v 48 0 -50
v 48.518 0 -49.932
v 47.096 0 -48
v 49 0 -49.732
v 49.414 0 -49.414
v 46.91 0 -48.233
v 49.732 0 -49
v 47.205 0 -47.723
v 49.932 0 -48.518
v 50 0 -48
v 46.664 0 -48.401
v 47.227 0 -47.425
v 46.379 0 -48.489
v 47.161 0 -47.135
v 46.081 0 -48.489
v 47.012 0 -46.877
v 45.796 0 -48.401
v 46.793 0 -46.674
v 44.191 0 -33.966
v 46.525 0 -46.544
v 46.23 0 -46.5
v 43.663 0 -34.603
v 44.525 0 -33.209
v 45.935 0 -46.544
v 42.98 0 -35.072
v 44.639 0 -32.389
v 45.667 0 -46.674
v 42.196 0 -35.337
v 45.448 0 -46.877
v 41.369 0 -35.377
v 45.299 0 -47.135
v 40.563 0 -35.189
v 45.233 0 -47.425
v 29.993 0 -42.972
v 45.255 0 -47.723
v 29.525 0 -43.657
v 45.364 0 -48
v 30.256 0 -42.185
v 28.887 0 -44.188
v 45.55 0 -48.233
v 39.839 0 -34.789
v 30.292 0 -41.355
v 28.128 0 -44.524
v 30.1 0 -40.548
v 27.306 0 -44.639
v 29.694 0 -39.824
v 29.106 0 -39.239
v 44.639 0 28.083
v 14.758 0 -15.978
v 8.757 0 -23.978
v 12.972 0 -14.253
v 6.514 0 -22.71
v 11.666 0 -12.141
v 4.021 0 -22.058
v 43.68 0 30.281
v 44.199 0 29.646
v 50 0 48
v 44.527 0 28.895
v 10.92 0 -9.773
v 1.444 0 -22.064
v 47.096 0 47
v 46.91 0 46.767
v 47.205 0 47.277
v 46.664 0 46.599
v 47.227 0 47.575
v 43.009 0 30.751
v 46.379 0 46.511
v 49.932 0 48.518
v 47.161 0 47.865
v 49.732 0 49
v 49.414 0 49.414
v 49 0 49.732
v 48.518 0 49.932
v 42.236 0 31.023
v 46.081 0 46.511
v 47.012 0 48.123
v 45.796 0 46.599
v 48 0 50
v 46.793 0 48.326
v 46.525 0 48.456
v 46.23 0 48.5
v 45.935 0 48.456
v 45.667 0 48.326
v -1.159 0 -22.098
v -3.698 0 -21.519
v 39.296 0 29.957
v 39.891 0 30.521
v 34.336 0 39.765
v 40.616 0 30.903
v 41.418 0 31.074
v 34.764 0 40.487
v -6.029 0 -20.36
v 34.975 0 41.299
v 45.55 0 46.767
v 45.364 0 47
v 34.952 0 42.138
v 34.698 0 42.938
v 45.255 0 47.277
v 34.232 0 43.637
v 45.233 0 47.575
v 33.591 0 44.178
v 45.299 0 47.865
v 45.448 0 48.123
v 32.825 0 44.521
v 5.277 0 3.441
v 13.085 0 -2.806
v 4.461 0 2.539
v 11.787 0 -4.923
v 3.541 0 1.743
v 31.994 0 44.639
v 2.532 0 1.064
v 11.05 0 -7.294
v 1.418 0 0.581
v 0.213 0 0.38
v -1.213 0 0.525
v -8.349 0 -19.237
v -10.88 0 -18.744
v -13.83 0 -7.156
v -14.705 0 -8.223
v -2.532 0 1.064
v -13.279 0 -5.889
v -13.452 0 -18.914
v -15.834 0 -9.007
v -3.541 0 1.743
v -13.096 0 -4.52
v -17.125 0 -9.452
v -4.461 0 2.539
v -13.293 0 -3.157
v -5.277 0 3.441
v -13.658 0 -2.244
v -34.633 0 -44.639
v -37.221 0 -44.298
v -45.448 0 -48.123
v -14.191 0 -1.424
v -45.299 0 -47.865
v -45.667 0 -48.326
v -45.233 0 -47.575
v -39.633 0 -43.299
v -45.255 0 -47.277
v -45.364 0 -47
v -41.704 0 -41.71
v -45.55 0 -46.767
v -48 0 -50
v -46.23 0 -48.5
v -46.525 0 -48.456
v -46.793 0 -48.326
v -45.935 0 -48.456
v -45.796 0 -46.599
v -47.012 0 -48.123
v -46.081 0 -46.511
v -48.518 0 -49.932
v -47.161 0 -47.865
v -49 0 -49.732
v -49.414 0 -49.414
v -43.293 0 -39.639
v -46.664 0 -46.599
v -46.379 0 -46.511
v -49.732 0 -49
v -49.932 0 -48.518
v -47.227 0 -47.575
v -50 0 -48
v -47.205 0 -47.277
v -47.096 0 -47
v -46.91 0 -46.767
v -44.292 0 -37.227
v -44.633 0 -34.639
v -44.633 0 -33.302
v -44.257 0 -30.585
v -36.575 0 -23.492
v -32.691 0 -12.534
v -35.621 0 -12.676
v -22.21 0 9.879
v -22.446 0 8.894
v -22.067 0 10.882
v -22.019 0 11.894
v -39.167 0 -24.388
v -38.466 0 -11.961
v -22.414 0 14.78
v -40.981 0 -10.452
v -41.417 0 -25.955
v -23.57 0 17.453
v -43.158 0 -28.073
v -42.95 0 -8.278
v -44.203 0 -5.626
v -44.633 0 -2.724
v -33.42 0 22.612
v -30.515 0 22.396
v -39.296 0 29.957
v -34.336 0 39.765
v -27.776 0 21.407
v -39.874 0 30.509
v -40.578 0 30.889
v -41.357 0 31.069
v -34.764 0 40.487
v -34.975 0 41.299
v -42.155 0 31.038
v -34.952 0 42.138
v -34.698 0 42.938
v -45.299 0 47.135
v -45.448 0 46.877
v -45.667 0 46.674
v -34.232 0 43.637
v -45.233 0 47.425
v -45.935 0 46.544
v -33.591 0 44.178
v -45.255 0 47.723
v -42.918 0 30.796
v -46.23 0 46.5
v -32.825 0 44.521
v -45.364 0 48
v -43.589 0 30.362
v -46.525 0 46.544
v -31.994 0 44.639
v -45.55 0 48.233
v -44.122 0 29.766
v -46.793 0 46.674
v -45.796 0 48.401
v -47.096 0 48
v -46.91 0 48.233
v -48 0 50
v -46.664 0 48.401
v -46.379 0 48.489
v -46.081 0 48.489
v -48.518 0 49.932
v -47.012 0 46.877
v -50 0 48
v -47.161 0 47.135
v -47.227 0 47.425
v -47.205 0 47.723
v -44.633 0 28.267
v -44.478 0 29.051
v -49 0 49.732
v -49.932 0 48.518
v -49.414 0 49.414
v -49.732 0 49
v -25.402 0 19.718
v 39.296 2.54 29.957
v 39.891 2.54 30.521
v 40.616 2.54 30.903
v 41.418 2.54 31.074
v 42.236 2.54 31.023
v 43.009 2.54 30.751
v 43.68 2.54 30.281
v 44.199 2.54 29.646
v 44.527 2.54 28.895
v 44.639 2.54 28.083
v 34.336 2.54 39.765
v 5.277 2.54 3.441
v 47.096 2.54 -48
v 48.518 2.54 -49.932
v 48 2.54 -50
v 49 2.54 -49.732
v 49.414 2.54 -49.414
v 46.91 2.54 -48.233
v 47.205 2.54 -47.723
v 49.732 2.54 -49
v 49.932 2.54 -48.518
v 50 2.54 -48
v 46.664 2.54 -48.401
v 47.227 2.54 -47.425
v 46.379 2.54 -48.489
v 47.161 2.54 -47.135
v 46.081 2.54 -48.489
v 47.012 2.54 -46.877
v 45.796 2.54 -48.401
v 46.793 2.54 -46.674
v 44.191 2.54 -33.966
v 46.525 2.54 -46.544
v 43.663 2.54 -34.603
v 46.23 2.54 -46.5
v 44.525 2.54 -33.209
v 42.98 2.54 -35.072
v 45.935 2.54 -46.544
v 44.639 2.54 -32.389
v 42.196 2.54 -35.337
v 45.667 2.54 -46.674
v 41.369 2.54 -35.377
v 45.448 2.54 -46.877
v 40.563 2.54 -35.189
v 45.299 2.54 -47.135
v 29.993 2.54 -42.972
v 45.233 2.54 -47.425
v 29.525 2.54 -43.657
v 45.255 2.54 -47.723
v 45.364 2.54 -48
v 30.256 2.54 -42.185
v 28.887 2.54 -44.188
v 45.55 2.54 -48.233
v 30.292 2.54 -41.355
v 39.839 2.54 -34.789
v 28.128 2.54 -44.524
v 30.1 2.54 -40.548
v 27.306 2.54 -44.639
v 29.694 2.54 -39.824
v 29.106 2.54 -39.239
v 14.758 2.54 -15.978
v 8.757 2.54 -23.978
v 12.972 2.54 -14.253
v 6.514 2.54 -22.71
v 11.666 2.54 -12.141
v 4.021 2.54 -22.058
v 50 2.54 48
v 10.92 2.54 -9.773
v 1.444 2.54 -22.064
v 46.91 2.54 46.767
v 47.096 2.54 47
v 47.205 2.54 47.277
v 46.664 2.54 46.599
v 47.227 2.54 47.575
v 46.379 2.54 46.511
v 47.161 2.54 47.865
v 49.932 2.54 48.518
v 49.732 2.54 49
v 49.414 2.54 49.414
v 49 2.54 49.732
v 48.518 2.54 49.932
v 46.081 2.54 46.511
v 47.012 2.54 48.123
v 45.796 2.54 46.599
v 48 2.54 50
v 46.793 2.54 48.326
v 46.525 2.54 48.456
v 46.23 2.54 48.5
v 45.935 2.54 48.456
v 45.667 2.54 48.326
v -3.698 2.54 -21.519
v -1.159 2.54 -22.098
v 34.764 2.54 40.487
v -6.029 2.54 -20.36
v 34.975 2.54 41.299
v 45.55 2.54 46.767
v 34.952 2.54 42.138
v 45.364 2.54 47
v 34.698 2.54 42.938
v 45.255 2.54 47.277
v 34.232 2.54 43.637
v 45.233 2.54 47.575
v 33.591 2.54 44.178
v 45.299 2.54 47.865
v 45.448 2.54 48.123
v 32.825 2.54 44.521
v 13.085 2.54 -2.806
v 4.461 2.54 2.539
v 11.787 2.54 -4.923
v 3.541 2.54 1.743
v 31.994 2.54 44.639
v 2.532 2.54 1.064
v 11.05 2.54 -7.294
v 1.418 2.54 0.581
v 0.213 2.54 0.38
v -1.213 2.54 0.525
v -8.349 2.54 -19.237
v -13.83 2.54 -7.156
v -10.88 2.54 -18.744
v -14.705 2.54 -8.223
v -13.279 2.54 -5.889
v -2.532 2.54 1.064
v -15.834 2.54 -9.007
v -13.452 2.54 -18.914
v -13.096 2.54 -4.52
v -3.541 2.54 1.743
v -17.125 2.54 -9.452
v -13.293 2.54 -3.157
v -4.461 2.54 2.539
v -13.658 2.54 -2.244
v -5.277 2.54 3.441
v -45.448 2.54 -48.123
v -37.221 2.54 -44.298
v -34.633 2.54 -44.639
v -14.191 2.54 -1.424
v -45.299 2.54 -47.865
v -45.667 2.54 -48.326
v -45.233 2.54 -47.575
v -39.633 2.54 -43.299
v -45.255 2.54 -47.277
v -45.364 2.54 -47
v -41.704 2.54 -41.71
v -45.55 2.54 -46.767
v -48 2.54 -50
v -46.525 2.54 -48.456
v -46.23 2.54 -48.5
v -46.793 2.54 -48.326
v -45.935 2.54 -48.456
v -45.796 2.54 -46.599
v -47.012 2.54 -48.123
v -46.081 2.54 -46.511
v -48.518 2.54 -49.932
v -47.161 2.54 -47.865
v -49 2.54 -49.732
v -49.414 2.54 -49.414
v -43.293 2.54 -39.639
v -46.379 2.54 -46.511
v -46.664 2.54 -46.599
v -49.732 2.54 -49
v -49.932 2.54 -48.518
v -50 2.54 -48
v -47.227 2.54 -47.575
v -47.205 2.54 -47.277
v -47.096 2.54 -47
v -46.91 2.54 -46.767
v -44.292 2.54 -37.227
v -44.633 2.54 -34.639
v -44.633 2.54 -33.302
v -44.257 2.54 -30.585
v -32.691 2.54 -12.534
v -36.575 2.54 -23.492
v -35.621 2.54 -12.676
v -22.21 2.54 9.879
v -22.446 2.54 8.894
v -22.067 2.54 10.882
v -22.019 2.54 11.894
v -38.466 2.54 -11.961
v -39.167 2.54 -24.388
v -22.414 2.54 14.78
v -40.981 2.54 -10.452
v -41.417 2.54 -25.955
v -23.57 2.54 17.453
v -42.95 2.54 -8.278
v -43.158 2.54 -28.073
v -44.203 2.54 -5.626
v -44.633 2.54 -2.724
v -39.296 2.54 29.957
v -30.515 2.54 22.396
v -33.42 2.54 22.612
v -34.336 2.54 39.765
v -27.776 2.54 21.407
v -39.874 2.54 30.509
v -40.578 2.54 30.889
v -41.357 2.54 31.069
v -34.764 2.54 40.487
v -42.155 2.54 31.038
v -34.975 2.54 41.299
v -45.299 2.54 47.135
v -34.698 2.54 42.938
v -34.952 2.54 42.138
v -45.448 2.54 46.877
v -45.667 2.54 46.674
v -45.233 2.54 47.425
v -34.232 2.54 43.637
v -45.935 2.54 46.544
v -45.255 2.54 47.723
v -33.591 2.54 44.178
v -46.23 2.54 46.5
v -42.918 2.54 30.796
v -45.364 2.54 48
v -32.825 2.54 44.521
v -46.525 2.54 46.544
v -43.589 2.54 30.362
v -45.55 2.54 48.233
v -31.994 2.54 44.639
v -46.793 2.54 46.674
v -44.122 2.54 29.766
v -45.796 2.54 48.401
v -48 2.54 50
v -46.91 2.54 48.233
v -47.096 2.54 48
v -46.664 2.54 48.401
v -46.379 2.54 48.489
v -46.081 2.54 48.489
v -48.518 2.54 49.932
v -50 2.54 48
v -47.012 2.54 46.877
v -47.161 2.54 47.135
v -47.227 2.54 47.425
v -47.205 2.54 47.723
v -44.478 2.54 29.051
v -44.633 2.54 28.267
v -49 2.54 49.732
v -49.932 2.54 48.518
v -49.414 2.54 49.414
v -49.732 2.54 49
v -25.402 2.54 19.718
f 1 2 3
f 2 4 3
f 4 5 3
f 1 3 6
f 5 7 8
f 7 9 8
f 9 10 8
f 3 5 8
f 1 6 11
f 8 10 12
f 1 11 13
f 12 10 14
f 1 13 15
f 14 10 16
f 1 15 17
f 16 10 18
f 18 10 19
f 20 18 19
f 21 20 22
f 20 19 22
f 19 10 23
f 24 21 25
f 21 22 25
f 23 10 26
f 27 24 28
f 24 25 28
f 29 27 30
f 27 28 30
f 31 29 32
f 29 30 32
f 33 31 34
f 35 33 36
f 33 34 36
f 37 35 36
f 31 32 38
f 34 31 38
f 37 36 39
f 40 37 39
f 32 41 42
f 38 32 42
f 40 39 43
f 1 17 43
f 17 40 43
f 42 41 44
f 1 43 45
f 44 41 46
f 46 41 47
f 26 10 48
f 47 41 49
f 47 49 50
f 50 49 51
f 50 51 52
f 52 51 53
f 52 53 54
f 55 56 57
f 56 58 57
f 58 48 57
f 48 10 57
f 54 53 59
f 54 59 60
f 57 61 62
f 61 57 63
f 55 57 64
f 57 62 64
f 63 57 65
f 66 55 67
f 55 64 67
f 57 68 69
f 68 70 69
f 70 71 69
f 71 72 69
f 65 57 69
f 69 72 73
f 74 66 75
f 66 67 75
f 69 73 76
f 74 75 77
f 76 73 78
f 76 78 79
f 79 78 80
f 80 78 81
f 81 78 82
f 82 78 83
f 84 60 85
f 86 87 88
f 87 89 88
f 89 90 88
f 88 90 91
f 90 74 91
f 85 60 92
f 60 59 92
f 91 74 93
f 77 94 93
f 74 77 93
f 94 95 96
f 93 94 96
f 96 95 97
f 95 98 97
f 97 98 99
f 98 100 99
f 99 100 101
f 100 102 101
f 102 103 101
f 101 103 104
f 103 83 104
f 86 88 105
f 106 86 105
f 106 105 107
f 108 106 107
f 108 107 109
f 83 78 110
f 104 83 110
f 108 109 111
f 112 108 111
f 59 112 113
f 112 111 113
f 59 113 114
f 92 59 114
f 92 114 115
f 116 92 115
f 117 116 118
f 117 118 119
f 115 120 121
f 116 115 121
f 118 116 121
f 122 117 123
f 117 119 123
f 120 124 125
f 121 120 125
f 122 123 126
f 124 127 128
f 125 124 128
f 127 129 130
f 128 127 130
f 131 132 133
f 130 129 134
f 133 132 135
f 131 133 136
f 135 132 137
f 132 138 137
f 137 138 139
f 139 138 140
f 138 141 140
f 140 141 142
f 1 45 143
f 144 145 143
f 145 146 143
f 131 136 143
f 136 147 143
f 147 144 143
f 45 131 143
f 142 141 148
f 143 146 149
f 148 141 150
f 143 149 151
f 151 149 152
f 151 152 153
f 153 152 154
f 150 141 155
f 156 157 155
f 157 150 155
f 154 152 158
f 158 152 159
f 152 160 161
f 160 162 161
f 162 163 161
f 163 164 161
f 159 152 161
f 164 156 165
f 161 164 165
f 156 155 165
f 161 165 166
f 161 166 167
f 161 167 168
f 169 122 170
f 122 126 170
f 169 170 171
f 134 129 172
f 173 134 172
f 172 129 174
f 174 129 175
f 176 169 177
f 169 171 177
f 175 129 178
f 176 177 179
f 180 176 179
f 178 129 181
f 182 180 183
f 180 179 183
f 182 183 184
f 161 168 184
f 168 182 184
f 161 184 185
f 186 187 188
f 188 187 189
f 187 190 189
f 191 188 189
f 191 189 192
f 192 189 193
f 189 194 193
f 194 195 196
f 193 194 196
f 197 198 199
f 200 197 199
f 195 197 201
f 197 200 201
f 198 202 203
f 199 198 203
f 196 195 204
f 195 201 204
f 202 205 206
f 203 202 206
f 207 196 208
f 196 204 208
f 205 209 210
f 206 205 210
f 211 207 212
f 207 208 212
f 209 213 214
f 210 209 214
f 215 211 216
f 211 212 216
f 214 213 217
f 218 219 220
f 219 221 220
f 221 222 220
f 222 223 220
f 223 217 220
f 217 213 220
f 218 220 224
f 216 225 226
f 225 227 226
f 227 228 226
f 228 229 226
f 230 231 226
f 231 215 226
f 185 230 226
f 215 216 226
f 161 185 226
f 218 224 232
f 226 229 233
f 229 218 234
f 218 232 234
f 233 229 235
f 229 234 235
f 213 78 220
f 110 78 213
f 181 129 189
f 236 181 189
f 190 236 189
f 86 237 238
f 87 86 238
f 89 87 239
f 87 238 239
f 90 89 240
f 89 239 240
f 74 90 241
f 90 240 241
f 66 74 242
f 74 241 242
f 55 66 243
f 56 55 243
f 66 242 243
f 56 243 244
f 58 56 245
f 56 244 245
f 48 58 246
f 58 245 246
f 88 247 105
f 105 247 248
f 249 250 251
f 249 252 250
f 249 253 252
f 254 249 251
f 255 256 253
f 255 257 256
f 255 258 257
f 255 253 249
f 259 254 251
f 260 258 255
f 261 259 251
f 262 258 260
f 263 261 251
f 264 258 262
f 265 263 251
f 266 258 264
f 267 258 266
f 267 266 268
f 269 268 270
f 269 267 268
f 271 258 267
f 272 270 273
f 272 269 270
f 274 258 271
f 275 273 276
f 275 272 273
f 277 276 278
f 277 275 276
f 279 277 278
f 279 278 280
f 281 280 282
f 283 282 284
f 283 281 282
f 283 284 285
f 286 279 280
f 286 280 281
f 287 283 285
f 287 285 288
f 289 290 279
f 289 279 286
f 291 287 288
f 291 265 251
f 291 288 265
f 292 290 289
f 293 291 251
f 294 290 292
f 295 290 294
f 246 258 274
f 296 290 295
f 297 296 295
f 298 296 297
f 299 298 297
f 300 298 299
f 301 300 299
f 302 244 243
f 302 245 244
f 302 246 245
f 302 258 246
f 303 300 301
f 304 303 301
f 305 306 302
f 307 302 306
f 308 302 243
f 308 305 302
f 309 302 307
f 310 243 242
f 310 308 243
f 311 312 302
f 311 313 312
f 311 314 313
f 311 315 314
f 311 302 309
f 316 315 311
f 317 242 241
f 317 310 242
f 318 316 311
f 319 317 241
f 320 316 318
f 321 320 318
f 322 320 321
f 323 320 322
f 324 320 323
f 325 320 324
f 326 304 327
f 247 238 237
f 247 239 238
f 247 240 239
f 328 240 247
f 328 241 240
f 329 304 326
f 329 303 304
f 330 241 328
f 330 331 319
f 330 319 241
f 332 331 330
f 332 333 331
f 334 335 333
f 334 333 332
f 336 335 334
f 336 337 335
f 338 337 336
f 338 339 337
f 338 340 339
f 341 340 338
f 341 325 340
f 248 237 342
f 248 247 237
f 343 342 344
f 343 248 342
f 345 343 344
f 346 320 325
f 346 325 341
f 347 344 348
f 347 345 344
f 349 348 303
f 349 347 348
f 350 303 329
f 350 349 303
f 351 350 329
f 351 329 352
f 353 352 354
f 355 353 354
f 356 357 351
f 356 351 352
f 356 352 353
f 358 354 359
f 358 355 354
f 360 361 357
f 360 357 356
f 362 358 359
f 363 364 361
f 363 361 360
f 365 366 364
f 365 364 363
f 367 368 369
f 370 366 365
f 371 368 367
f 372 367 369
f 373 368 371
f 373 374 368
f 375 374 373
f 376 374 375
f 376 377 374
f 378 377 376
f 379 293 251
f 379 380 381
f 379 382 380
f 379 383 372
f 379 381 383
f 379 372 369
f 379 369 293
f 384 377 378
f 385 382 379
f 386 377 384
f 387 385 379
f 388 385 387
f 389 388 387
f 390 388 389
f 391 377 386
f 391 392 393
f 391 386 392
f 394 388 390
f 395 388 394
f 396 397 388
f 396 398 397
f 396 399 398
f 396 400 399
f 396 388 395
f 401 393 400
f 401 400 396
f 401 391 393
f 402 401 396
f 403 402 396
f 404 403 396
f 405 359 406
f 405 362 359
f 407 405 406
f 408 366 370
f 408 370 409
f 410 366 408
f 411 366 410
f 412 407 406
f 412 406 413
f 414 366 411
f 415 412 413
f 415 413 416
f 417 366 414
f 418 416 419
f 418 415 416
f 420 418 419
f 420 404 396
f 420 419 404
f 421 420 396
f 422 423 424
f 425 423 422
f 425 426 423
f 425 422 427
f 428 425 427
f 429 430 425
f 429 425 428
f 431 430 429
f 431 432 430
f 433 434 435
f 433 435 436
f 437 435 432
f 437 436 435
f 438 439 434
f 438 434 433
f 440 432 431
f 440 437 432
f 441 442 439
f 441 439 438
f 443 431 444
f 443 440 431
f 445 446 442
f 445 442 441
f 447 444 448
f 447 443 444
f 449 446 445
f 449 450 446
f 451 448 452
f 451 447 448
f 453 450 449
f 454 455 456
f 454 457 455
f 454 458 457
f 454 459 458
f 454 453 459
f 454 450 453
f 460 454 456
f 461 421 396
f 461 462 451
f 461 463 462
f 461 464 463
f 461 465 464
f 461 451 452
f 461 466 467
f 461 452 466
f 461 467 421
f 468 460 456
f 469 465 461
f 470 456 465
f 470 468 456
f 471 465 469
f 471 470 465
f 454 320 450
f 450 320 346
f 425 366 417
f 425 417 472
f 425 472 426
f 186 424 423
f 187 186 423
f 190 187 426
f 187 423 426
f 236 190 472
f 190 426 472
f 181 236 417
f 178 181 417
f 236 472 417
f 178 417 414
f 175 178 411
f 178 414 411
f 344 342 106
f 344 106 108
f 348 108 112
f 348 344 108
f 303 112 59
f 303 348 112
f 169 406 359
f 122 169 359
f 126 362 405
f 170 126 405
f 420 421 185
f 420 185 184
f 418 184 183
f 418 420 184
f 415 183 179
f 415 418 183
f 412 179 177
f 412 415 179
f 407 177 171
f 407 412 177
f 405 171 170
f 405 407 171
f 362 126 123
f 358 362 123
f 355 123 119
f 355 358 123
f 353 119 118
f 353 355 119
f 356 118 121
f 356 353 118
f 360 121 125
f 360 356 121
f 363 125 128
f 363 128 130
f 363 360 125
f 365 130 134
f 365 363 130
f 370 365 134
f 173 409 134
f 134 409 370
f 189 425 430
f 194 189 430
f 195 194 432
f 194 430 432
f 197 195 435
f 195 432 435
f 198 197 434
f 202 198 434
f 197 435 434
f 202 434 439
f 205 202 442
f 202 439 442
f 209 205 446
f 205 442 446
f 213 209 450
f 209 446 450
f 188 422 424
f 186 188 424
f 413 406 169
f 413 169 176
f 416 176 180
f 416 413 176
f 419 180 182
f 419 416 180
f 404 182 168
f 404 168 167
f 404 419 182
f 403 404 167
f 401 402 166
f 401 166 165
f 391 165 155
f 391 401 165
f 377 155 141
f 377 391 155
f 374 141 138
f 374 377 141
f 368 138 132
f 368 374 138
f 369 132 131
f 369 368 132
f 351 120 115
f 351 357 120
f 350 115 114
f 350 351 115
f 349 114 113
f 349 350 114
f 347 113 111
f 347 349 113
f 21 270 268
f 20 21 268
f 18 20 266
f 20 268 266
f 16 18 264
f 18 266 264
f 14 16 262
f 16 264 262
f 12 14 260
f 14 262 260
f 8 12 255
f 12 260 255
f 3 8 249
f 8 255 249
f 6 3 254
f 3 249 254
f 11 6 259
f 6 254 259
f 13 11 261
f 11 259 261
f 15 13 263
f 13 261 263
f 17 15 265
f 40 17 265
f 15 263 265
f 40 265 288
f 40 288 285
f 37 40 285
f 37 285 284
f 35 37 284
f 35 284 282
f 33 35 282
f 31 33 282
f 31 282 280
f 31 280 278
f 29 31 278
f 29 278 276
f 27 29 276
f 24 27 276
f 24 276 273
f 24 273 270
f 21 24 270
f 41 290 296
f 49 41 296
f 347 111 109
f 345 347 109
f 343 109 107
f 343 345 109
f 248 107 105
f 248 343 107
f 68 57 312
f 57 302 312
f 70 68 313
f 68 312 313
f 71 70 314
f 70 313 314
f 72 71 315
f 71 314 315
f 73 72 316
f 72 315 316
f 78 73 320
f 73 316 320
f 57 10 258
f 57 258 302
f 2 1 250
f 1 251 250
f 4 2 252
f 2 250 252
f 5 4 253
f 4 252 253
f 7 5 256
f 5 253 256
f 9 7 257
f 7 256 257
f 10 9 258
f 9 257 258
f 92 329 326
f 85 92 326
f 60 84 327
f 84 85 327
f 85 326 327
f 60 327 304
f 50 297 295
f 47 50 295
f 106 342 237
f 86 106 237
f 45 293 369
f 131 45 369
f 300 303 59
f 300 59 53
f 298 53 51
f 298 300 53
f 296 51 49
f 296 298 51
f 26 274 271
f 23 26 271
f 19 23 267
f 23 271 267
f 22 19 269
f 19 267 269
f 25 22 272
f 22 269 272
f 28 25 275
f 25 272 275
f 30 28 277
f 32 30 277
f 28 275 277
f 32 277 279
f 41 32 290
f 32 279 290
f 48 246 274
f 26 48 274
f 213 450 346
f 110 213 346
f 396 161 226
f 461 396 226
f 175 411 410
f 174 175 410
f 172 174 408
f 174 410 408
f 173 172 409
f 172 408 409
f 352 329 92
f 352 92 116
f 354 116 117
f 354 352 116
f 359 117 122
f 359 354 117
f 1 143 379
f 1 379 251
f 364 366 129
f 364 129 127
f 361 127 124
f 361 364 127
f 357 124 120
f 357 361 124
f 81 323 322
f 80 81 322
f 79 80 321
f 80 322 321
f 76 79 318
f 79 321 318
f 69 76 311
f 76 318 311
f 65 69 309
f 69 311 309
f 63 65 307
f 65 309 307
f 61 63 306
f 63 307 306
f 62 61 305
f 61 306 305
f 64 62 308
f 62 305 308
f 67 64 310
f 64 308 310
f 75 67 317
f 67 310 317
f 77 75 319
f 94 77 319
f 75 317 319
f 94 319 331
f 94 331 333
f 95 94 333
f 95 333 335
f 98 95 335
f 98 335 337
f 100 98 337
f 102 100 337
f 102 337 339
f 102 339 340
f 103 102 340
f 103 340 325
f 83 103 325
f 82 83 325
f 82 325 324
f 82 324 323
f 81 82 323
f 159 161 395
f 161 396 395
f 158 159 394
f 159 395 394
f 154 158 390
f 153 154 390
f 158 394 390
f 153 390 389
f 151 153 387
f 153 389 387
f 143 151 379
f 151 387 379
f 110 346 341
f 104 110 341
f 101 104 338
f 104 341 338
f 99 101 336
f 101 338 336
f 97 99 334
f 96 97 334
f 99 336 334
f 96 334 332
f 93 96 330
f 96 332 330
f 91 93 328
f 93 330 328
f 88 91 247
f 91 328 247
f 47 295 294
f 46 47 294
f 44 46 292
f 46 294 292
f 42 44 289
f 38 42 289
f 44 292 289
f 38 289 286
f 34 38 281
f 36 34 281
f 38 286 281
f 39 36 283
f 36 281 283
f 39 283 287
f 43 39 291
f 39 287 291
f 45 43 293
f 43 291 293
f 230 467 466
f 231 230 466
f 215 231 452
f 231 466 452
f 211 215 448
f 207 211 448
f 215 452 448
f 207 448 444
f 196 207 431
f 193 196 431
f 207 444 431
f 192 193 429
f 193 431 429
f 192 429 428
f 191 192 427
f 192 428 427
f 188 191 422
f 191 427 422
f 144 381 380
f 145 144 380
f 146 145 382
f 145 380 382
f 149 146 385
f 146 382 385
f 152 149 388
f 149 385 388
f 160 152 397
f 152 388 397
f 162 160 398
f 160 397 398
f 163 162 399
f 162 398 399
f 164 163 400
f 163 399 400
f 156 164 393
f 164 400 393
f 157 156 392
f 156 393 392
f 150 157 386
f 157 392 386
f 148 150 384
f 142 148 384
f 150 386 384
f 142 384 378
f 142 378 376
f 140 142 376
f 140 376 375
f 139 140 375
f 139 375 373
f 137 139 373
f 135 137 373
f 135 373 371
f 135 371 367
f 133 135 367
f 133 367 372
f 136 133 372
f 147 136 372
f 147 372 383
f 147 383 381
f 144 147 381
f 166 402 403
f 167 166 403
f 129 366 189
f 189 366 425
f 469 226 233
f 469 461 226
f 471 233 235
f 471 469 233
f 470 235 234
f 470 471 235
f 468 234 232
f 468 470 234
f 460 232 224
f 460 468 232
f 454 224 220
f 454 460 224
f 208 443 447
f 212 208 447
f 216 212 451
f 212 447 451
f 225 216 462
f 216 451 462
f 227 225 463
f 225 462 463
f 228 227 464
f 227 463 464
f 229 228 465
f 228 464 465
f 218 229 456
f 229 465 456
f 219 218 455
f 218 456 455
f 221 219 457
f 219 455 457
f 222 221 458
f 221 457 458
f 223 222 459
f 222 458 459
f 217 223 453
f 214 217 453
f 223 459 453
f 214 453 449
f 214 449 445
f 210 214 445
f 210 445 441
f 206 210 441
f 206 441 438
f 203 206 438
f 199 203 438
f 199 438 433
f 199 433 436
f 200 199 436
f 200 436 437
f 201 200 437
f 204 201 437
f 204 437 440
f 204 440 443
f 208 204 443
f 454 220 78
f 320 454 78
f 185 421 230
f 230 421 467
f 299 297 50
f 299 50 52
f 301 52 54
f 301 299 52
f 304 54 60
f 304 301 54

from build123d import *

# Parameters (mm, degrees)
SKETCH1_W           = 100
SKETCH1_H           = 100
BOSS_EXTRUDE1_DEPTH = 2.54
FILLET1_R           = 2
CUT_EXTRUDE1_DEPTH  = 10
SKETCH2_R           = 1
CUT_EXTRUDE2_DEPTH  = 10
FILLET2_R           = 10
FILLET3_R           = 5


with BuildPart() as part:
    # Sketch1 → Boss-Extrude1 (new body)
    with BuildSketch(Plane.XZ):
        Rectangle(SKETCH1_W, SKETCH1_H)
    extrude(amount=-BOSS_EXTRUDE1_DEPTH)

    # Fillet1
    fillet1_edges = [part.edges().sort_by_distance(p)[0] for p in [
        (-50, 1.27, 50),
        (50, 1.27, 50),
        (50, 1.27, -50),
        (-50, 1.27, -50),
    ]]
    fillet(fillet1_edges, radius=FILLET1_R)

    # Sketch5 → Cut-Extrude1 (cut)
    with BuildSketch(Plane(origin=(0, 2.54, 0), x_dir=(1, 0, 0), z_dir=(0, 1, 0))):
        with BuildLine():
            Line((-10.582420377, 8.15726173), (-44.633181304, 14.898200311))
            Line((-44.633181304, 14.898200311), (-44.633181304, -28.266598236))
            ThreePointArc((-44.633181304, -28.266598236), (-42.544556917, -30.942665333), (-39.296225546, -29.95674939))
            Line((-39.296225546, -29.95674939), (-33.420366711, -22.611976162))
            ThreePointArc((-33.420366711, -22.611976162), (-41.143464147, -5.184990934), (-22.44623806, -8.89440932))
            Line((-22.44623806, -8.89440932), (-10.025095622, 6.631912364))
            ThreePointArc((-10.025095622, 6.631912364), (-10.331945682, 7.384287968), (-10.582420377, 8.15726173))
        make_face()
        with BuildLine():
            Line((34.336383268, -39.764732741), (2.216428403, 0.384935794))
            ThreePointArc((2.216428403, 0.384935794), (0, 0.159324182), (-2.216428403, 0.384935794))
            Line((-2.216428403, 0.384935794), (-34.336383268, -39.764732741))
            ThreePointArc((-34.336383268, -39.764732741), (-34.697694983, -42.938387386), (-31.993783102, -44.638825712))
            Line((-31.993783102, -44.638825712), (31.993783102, -44.638825712))
            ThreePointArc((31.993783102, -44.638825712), (34.697694983, -42.938387386), (34.336383268, -39.764732741))
        make_face()
        with BuildLine():
            Line((39.838812559, 34.788749055), (10.83835688, 13.038158963))
            ThreePointArc((10.83835688, 13.038158963), (10.959514717, 12.102211852), (11, 11.159324182))
            ThreePointArc((11, 11.159324182), (10.75351226, 8.843730505), (10.025095622, 6.631912364))
            Line((10.025095622, 6.631912364), (39.296225546, -29.95674939))
            ThreePointArc((39.296225546, -29.95674939), (42.631851266, -30.913539718), (44.638825712, -28.08265642))
            Line((44.638825712, -28.08265642), (44.638825712, 32.38875892))
            ThreePointArc((44.638825712, 32.38875892), (42.980459146, 35.072044169), (39.838812559, 34.788749055))
        make_face()
        with BuildLine():
            Line((27.305635475, 44.638825712), (-34.363291806, 44.638825712))
            Line((-34.363291806, 44.638825712), (-44.633181304, 44.638825712))
            Line((-44.633181304, 44.638825712), (-44.633181304, 34.358849433))
            Line((-44.633181304, 34.358849433), (-44.633181304, 25.087137554))
            Line((-44.633181304, 25.087137554), (-8.643933661, 17.962441914))
            ThreePointArc((-8.643933661, 17.962441914), (-2.446557859, 21.883798745), (4.838313038, 21.038126081))
            Line((4.838313038, 21.038126081), (29.105648628, 39.238835577))
            ThreePointArc((29.105648628, 39.238835577), (30.15168277, 42.587516809), (27.305635475, 44.638825712))
        make_face()
        with BuildLine():
            Line((-33.420366711, -22.611976162), (-22.44623806, -8.89440932))
            ThreePointArc((-22.44623806, -8.89440932), (-41.143464147, -5.184990934), (-33.420366711, -22.611976162))
        make_face()
        with BuildLine():
            ThreePointArc((-22.01893977, -11.893547741), (-22.12630101, -10.378835302), (-22.44623806, -8.89440932))
            Line((-22.44623806, -8.89440932), (-33.420366711, -22.611976162))
            ThreePointArc((-33.420366711, -22.611976162), (-25.402259154, -19.71782477), (-22.01893977, -11.893547741))
        make_face()
    extrude(amount=-CUT_EXTRUDE1_DEPTH, mode=Mode.SUBTRACT)

    # Sketch2 → Cut-Extrude2 (cut)
    with BuildSketch(Plane(origin=(0, 2.54, 0), x_dir=(1, 0, 0), z_dir=(0, 1, 0))):
        with Locations(Location((-46.23, -47.5, 0), (0, 0, 90))):
            Circle(SKETCH2_R)
        with Locations(Location((-46.23, 47.5, 0), (0, 0, 90))):
            Circle(SKETCH2_R)
        with Locations(Location((46.23, 47.5, 0), (0, 0, 270))):
            Circle(SKETCH2_R)
        with Locations(Location((46.23, -47.5, 0), (0, 0, 270))):
            Circle(SKETCH2_R)
    extrude(amount=-CUT_EXTRUDE2_DEPTH, mode=Mode.SUBTRACT)

    # Fillet2
    # the kernel refuses this fillet: 10 mm, written as the material it adds along each edge
    with BuildSketch(Plane(origin=(-2.216428403, 2.54, -0.384935794), x_dir=(0.9991591303691161, 0, 0.04100039268143086), z_dir=(0, -1, 0)), Plane(origin=(-10.582420377, 2.54, -8.15726173), x_dir=(0.42439359901934914, 0, 0.9054778148090675), z_dir=(0, -1, 0))) as fillet2_piece_1:
        with BuildLine():
            CenterArc((5.15726697, 9.869275424), FILLET2_R, 216.310191596, 44.415308597)
            Line((-2.90096267, 3.94771017), (0, 0))
            ThreePointArc((0, 0), (1.772810521, 0.143797033), (3.545621042, 0))
        make_face()
    extrude(amount=2.54)
    with BuildSketch(Plane(origin=(2.216428403, 2.54, -0.384935794), x_dir=(0.6246976569815567, 0, 0.780866721894174), z_dir=(0, -1, 0)), Plane(origin=(10.83835688, 2.54, -13.038158963), x_dir=(0.7999967117807752, 0, -0.6000043842672711), z_dir=(0, -1, 0)), Plane(origin=(-10.025095622, 2.54, -6.631912364), x_dir=(-0.624697656981556, 0, 0.7808667218941745), z_dir=(0, -1, 0))) as fillet2_piece_2:
        with BuildLine():
            CenterArc((4.898979486, 10), FILLET2_R, 225.584691403, 44.415308597)
            ThreePointArc((-2.099562637, 2.857142857), (-0.933906367, 1.51372178), (0, 0))
            Line((0, 0), (4.898979486, 0))
        make_face()
    extrude(amount=2.54)
    with BuildSketch(Plane(origin=(4.838313038, 2.54, -21.038126081), x_dir=(0.7999967117807896, 0, -0.600004384267252), z_dir=(0, -1, 0)), Plane(origin=(10.025095622, 2.54, -6.631912364), x_dir=(0.6246976569815559, 0, 0.7808667218941746), z_dir=(0, -1, 0))) as fillet2_piece_3:
        with BuildLine():
            CenterArc((4.898979486, -10), FILLET2_R, 90, 44.415308597)
            ThreePointArc((-2.099562637, -2.857142857), (-0.933906367, -1.51372178), (0, 0))
            Line((0, 0), (4.898979486, 0))
        make_face()
    extrude(amount=2.54)
    with BuildSketch(Plane(origin=(-8.643933661, 2.54, -17.962441914), x_dir=(0.7370833881406508, 0, -0.6758018044716206), z_dir=(0, -1, 0))) as fillet2_piece_4:
        with BuildLine():
            CenterArc((5.159972861, -9.869137303), FILLET2_R, 99.279408895, 44.434942373)
            Line((-2.900792564, -3.951024364), (0, 0))
            ThreePointArc((0, 0), (1.773740671, -0.143948967), (3.547481342, 0))
        make_face()
    extrude(amount=2.54)
    with BuildSketch(Plane(origin=(-44.633181304, 2.54, -25.087137554), x_dir=(0.9809622556130392, 0, 0.19419848882671173), z_dir=(0, -1, 0))) as fillet2_piece_5:
        with BuildLine():
            CenterArc((FILLET2_R * 0.821439873515, -FILLET2_R), FILLET2_R, 90, 78.802094649)
            Line((-FILLET2_R * 0.159522382099, -FILLET2_R * 0.805801511173), (0, 0))
            Line((0, 0), (FILLET2_R * 0.821439873515, 0))
        make_face()
    extrude(amount=2.54)
    with BuildSketch(Plane(origin=(-44.633181304, 2.54, -44.638825712), x_dir=(1, 0, 0), z_dir=(0, -1, 0))) as fillet2_piece_6:
        with BuildLine():
            CenterArc((FILLET2_R, FILLET2_R), FILLET2_R, 180, 90)
            Line((0, FILLET2_R), (0, 0))
            Line((0, 0), (FILLET2_R, 0))
        make_face()
    extrude(amount=2.54)
    with BuildSketch(Plane(origin=(-44.633181304, 2.54, -14.898200311), x_dir=(0.9809622556130391, 0, 0.19419848882671228), z_dir=(0, -1, 0))) as fillet2_piece_7:
        with BuildLine():
            CenterArc((FILLET2_R * 1.21737455442, FILLET2_R), FILLET2_R, 168.802094649, 101.197905351)
            Line((FILLET2_R * 0.236412298804, FILLET2_R * 1.19419848883), (0, 0))
            Line((0, 0), (FILLET2_R * 1.21737455442, 0))
        make_face()
    extrude(amount=2.54)

    # Fillet3
    fillet3_edges = [part.edges().sort_by_distance(p)[0] for p in [
        (0, 1.27, 0.013314064),
        (-11.084977947, 1.27, -7.109148691),
    ]]
    fillet(fillet3_edges, radius=FILLET3_R)


solid = part.part
